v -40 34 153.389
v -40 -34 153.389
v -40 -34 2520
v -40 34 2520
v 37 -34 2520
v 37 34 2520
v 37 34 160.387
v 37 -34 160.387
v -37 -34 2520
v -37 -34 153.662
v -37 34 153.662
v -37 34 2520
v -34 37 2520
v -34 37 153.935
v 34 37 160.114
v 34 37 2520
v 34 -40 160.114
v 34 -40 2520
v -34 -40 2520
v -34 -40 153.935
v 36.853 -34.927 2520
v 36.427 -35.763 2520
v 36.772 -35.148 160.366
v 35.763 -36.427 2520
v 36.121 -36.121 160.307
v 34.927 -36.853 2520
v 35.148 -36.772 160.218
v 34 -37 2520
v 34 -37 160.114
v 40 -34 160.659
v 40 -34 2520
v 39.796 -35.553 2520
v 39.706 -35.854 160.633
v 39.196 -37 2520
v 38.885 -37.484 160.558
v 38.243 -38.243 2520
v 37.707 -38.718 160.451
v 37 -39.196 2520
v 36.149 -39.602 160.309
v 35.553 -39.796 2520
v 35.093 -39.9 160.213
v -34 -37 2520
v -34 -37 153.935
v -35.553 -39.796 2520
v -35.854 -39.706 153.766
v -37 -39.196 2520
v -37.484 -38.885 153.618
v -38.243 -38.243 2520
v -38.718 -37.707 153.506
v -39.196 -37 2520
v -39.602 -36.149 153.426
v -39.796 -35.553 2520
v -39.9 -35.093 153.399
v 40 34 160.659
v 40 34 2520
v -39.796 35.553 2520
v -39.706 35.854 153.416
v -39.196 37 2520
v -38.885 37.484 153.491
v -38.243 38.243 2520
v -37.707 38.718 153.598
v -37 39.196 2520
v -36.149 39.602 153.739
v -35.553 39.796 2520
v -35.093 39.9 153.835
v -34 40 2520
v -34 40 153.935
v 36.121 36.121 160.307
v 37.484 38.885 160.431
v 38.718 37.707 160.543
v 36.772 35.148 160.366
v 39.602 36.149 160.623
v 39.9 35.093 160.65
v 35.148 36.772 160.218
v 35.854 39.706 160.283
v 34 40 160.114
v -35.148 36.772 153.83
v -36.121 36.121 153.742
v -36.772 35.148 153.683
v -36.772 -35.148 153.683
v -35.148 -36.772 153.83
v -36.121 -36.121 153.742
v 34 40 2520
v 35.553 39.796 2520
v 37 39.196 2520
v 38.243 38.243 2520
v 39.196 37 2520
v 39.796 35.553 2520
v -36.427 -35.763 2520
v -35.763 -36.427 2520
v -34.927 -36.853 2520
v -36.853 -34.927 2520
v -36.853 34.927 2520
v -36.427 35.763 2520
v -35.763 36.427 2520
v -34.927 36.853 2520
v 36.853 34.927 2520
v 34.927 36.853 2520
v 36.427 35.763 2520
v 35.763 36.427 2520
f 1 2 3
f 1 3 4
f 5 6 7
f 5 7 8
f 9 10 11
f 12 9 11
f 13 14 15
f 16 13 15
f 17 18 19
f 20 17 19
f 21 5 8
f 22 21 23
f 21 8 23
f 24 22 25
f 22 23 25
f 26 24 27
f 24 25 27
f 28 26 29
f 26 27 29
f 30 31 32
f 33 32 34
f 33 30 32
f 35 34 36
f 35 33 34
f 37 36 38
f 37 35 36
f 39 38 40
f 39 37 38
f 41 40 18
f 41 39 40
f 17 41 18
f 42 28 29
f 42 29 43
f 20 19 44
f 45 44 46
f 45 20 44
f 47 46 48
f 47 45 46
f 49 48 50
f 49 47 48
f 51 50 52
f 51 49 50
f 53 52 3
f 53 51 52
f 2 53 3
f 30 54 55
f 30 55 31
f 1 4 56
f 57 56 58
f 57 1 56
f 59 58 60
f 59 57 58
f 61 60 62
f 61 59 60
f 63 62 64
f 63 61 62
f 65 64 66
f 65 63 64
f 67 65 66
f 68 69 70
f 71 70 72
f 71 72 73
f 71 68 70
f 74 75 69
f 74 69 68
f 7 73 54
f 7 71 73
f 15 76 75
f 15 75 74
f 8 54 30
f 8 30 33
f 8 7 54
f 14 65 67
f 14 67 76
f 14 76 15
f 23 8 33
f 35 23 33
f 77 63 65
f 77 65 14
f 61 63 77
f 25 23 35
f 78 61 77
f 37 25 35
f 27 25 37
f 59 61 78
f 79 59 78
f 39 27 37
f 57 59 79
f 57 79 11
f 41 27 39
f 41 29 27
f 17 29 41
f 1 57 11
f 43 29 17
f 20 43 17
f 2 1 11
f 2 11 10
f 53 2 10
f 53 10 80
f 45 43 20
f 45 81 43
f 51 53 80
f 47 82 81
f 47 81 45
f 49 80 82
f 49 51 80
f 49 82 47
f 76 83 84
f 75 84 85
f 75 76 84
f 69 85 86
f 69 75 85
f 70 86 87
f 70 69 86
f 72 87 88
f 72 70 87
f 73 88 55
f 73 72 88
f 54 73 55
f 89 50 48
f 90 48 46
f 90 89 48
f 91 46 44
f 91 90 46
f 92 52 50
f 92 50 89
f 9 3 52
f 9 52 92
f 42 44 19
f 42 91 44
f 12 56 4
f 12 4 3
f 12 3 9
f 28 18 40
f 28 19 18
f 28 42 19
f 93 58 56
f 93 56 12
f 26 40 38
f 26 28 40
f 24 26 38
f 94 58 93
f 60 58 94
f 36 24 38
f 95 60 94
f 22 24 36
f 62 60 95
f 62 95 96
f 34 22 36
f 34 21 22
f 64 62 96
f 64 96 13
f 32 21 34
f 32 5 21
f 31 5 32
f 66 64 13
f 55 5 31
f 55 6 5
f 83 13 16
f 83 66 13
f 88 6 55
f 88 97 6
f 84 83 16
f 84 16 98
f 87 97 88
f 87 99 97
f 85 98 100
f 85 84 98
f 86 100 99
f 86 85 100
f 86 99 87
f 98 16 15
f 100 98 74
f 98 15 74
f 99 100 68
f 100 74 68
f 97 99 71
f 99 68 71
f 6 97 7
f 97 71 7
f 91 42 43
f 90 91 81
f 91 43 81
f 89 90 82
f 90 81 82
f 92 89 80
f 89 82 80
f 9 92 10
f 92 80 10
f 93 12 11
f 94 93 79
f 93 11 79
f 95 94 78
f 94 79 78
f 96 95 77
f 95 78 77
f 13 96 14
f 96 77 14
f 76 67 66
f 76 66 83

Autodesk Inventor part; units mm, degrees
ref_plane "Start Plane" through (0, 0, 153.3871) normal (0, 0, 1) x (1, 0, 0)
ref_plane "End Plane" through (0, 0, 2520) normal (0, 0, 1) x (1, 0, 0)
sketch "Sketch" plane through (0, 0, 0) normal (0, 0, 1) x (1, 0, 0)
  line L0 (-40, -34) -> (-40, 34)
  line L1 (-34, 40) -> (34, 40)
  line L2 (40, 34) -> (40, -34)
  line L3 (34, -40) -> (-34, -40)
  arc A0 (-40, -34) -> (-34, -40) centre (-34, -34) ccw
  arc A1 (40, 34) -> (34, 40) centre (34, 34) ccw
  arc A2 (-34, 40) -> (-40, 34) centre (-34, 34) ccw
  arc A3 (34, -40) -> (40, -34) centre (34, -34) ccw
  arc A4 (-34, 37) -> (-37, 34) centre (-34, 34) ccw
  line L4 (-34, 37) -> (34, 37)
  arc A5 (37, 34) -> (34, 37) centre (34, 34) ccw
  line L5 (37, 34) -> (37, -34)
  arc A6 (34, -37) -> (37, -34) centre (34, -34) ccw
  line L6 (34, -37) -> (-34, -37)
  arc A7 (-37, -34) -> (-34, -37) centre (-34, -34) ccw
  line L7 (-37, -34) -> (-37, 34)
  line L8 (0, 57.7397) -> (0, -57.7397) construction
  line L9 (-57.7397, 0) -> (57.7397, 0) construction
  dimension "d7" = 6
  dimension "d9" = 80
  dimension "d11" = 80
  dimension "d12" = 3
  dimension "d15" = 40
  dimension "d16" = 40
extrude "Body" add sketch "Sketch" along normal up to surface (2366.6129 mm away) from surface at 153.3871
sketch "Sketch3" plane through (0, 0, 0) normal (0, 0, 1) x (1, 0, 0)
  line L0 (0, 0) -> (10, 0)
ref_plane "Work Plane3" through (0, 0, 0) normal (0, -1, 0) x (1, 0, 0)
ref_plane "Work Plane4" through (25.5143, 34, 159.3429) normal (0.0905, 0, -0.9959) x (-0.9959, 0, -0.0905)
split "Split1" plane through (25.5143, 34, 159.3429) removes the side toward (0.0905, 0, -0.9959)
ref_plane "Work Plane5" through (-2160, 34, 2520) normal (0, 0, 1) x (1, 0, 0)
split "Split2" plane through (-2160, 34, 2520) removes the side toward (0, 0, 1)
sketch "Sketch4" plane through (0, 0, 0) normal (0, -1, 0) x (1, 0, 0)
  line L0 (-2, 153.3871) -> (12, 153.3871) projected
  line L1 (-2, 2520) -> (12, 2520) projected
  dimension "d18" = 2366.6129
equation "\"d7\" = G_IR"
equation "\"d9\" = G_W"
equation "\"d11\" = G_H"
equation "\"d12\" = G_T"
equation "\"d15\" = 0.5 * d9"
equation "\"d16\" = 0.5 * d11"
equation "\"d3\" = G_L"
equation "\"G_W\" = 80"
equation "\"G_H\" = 80"
equation "\"G_T\" = 3"
equation "\"G_IR\" = 6"
equation "\"G_L\" = d18"
equation "\"G_OFFSET_START\" = -153.38707"
equation "\"d13\" = -G_OFFSET_START"
properties part number "ISO 10799-2 - 80x80x3 - 2366,61" material "Steel, Mild"
